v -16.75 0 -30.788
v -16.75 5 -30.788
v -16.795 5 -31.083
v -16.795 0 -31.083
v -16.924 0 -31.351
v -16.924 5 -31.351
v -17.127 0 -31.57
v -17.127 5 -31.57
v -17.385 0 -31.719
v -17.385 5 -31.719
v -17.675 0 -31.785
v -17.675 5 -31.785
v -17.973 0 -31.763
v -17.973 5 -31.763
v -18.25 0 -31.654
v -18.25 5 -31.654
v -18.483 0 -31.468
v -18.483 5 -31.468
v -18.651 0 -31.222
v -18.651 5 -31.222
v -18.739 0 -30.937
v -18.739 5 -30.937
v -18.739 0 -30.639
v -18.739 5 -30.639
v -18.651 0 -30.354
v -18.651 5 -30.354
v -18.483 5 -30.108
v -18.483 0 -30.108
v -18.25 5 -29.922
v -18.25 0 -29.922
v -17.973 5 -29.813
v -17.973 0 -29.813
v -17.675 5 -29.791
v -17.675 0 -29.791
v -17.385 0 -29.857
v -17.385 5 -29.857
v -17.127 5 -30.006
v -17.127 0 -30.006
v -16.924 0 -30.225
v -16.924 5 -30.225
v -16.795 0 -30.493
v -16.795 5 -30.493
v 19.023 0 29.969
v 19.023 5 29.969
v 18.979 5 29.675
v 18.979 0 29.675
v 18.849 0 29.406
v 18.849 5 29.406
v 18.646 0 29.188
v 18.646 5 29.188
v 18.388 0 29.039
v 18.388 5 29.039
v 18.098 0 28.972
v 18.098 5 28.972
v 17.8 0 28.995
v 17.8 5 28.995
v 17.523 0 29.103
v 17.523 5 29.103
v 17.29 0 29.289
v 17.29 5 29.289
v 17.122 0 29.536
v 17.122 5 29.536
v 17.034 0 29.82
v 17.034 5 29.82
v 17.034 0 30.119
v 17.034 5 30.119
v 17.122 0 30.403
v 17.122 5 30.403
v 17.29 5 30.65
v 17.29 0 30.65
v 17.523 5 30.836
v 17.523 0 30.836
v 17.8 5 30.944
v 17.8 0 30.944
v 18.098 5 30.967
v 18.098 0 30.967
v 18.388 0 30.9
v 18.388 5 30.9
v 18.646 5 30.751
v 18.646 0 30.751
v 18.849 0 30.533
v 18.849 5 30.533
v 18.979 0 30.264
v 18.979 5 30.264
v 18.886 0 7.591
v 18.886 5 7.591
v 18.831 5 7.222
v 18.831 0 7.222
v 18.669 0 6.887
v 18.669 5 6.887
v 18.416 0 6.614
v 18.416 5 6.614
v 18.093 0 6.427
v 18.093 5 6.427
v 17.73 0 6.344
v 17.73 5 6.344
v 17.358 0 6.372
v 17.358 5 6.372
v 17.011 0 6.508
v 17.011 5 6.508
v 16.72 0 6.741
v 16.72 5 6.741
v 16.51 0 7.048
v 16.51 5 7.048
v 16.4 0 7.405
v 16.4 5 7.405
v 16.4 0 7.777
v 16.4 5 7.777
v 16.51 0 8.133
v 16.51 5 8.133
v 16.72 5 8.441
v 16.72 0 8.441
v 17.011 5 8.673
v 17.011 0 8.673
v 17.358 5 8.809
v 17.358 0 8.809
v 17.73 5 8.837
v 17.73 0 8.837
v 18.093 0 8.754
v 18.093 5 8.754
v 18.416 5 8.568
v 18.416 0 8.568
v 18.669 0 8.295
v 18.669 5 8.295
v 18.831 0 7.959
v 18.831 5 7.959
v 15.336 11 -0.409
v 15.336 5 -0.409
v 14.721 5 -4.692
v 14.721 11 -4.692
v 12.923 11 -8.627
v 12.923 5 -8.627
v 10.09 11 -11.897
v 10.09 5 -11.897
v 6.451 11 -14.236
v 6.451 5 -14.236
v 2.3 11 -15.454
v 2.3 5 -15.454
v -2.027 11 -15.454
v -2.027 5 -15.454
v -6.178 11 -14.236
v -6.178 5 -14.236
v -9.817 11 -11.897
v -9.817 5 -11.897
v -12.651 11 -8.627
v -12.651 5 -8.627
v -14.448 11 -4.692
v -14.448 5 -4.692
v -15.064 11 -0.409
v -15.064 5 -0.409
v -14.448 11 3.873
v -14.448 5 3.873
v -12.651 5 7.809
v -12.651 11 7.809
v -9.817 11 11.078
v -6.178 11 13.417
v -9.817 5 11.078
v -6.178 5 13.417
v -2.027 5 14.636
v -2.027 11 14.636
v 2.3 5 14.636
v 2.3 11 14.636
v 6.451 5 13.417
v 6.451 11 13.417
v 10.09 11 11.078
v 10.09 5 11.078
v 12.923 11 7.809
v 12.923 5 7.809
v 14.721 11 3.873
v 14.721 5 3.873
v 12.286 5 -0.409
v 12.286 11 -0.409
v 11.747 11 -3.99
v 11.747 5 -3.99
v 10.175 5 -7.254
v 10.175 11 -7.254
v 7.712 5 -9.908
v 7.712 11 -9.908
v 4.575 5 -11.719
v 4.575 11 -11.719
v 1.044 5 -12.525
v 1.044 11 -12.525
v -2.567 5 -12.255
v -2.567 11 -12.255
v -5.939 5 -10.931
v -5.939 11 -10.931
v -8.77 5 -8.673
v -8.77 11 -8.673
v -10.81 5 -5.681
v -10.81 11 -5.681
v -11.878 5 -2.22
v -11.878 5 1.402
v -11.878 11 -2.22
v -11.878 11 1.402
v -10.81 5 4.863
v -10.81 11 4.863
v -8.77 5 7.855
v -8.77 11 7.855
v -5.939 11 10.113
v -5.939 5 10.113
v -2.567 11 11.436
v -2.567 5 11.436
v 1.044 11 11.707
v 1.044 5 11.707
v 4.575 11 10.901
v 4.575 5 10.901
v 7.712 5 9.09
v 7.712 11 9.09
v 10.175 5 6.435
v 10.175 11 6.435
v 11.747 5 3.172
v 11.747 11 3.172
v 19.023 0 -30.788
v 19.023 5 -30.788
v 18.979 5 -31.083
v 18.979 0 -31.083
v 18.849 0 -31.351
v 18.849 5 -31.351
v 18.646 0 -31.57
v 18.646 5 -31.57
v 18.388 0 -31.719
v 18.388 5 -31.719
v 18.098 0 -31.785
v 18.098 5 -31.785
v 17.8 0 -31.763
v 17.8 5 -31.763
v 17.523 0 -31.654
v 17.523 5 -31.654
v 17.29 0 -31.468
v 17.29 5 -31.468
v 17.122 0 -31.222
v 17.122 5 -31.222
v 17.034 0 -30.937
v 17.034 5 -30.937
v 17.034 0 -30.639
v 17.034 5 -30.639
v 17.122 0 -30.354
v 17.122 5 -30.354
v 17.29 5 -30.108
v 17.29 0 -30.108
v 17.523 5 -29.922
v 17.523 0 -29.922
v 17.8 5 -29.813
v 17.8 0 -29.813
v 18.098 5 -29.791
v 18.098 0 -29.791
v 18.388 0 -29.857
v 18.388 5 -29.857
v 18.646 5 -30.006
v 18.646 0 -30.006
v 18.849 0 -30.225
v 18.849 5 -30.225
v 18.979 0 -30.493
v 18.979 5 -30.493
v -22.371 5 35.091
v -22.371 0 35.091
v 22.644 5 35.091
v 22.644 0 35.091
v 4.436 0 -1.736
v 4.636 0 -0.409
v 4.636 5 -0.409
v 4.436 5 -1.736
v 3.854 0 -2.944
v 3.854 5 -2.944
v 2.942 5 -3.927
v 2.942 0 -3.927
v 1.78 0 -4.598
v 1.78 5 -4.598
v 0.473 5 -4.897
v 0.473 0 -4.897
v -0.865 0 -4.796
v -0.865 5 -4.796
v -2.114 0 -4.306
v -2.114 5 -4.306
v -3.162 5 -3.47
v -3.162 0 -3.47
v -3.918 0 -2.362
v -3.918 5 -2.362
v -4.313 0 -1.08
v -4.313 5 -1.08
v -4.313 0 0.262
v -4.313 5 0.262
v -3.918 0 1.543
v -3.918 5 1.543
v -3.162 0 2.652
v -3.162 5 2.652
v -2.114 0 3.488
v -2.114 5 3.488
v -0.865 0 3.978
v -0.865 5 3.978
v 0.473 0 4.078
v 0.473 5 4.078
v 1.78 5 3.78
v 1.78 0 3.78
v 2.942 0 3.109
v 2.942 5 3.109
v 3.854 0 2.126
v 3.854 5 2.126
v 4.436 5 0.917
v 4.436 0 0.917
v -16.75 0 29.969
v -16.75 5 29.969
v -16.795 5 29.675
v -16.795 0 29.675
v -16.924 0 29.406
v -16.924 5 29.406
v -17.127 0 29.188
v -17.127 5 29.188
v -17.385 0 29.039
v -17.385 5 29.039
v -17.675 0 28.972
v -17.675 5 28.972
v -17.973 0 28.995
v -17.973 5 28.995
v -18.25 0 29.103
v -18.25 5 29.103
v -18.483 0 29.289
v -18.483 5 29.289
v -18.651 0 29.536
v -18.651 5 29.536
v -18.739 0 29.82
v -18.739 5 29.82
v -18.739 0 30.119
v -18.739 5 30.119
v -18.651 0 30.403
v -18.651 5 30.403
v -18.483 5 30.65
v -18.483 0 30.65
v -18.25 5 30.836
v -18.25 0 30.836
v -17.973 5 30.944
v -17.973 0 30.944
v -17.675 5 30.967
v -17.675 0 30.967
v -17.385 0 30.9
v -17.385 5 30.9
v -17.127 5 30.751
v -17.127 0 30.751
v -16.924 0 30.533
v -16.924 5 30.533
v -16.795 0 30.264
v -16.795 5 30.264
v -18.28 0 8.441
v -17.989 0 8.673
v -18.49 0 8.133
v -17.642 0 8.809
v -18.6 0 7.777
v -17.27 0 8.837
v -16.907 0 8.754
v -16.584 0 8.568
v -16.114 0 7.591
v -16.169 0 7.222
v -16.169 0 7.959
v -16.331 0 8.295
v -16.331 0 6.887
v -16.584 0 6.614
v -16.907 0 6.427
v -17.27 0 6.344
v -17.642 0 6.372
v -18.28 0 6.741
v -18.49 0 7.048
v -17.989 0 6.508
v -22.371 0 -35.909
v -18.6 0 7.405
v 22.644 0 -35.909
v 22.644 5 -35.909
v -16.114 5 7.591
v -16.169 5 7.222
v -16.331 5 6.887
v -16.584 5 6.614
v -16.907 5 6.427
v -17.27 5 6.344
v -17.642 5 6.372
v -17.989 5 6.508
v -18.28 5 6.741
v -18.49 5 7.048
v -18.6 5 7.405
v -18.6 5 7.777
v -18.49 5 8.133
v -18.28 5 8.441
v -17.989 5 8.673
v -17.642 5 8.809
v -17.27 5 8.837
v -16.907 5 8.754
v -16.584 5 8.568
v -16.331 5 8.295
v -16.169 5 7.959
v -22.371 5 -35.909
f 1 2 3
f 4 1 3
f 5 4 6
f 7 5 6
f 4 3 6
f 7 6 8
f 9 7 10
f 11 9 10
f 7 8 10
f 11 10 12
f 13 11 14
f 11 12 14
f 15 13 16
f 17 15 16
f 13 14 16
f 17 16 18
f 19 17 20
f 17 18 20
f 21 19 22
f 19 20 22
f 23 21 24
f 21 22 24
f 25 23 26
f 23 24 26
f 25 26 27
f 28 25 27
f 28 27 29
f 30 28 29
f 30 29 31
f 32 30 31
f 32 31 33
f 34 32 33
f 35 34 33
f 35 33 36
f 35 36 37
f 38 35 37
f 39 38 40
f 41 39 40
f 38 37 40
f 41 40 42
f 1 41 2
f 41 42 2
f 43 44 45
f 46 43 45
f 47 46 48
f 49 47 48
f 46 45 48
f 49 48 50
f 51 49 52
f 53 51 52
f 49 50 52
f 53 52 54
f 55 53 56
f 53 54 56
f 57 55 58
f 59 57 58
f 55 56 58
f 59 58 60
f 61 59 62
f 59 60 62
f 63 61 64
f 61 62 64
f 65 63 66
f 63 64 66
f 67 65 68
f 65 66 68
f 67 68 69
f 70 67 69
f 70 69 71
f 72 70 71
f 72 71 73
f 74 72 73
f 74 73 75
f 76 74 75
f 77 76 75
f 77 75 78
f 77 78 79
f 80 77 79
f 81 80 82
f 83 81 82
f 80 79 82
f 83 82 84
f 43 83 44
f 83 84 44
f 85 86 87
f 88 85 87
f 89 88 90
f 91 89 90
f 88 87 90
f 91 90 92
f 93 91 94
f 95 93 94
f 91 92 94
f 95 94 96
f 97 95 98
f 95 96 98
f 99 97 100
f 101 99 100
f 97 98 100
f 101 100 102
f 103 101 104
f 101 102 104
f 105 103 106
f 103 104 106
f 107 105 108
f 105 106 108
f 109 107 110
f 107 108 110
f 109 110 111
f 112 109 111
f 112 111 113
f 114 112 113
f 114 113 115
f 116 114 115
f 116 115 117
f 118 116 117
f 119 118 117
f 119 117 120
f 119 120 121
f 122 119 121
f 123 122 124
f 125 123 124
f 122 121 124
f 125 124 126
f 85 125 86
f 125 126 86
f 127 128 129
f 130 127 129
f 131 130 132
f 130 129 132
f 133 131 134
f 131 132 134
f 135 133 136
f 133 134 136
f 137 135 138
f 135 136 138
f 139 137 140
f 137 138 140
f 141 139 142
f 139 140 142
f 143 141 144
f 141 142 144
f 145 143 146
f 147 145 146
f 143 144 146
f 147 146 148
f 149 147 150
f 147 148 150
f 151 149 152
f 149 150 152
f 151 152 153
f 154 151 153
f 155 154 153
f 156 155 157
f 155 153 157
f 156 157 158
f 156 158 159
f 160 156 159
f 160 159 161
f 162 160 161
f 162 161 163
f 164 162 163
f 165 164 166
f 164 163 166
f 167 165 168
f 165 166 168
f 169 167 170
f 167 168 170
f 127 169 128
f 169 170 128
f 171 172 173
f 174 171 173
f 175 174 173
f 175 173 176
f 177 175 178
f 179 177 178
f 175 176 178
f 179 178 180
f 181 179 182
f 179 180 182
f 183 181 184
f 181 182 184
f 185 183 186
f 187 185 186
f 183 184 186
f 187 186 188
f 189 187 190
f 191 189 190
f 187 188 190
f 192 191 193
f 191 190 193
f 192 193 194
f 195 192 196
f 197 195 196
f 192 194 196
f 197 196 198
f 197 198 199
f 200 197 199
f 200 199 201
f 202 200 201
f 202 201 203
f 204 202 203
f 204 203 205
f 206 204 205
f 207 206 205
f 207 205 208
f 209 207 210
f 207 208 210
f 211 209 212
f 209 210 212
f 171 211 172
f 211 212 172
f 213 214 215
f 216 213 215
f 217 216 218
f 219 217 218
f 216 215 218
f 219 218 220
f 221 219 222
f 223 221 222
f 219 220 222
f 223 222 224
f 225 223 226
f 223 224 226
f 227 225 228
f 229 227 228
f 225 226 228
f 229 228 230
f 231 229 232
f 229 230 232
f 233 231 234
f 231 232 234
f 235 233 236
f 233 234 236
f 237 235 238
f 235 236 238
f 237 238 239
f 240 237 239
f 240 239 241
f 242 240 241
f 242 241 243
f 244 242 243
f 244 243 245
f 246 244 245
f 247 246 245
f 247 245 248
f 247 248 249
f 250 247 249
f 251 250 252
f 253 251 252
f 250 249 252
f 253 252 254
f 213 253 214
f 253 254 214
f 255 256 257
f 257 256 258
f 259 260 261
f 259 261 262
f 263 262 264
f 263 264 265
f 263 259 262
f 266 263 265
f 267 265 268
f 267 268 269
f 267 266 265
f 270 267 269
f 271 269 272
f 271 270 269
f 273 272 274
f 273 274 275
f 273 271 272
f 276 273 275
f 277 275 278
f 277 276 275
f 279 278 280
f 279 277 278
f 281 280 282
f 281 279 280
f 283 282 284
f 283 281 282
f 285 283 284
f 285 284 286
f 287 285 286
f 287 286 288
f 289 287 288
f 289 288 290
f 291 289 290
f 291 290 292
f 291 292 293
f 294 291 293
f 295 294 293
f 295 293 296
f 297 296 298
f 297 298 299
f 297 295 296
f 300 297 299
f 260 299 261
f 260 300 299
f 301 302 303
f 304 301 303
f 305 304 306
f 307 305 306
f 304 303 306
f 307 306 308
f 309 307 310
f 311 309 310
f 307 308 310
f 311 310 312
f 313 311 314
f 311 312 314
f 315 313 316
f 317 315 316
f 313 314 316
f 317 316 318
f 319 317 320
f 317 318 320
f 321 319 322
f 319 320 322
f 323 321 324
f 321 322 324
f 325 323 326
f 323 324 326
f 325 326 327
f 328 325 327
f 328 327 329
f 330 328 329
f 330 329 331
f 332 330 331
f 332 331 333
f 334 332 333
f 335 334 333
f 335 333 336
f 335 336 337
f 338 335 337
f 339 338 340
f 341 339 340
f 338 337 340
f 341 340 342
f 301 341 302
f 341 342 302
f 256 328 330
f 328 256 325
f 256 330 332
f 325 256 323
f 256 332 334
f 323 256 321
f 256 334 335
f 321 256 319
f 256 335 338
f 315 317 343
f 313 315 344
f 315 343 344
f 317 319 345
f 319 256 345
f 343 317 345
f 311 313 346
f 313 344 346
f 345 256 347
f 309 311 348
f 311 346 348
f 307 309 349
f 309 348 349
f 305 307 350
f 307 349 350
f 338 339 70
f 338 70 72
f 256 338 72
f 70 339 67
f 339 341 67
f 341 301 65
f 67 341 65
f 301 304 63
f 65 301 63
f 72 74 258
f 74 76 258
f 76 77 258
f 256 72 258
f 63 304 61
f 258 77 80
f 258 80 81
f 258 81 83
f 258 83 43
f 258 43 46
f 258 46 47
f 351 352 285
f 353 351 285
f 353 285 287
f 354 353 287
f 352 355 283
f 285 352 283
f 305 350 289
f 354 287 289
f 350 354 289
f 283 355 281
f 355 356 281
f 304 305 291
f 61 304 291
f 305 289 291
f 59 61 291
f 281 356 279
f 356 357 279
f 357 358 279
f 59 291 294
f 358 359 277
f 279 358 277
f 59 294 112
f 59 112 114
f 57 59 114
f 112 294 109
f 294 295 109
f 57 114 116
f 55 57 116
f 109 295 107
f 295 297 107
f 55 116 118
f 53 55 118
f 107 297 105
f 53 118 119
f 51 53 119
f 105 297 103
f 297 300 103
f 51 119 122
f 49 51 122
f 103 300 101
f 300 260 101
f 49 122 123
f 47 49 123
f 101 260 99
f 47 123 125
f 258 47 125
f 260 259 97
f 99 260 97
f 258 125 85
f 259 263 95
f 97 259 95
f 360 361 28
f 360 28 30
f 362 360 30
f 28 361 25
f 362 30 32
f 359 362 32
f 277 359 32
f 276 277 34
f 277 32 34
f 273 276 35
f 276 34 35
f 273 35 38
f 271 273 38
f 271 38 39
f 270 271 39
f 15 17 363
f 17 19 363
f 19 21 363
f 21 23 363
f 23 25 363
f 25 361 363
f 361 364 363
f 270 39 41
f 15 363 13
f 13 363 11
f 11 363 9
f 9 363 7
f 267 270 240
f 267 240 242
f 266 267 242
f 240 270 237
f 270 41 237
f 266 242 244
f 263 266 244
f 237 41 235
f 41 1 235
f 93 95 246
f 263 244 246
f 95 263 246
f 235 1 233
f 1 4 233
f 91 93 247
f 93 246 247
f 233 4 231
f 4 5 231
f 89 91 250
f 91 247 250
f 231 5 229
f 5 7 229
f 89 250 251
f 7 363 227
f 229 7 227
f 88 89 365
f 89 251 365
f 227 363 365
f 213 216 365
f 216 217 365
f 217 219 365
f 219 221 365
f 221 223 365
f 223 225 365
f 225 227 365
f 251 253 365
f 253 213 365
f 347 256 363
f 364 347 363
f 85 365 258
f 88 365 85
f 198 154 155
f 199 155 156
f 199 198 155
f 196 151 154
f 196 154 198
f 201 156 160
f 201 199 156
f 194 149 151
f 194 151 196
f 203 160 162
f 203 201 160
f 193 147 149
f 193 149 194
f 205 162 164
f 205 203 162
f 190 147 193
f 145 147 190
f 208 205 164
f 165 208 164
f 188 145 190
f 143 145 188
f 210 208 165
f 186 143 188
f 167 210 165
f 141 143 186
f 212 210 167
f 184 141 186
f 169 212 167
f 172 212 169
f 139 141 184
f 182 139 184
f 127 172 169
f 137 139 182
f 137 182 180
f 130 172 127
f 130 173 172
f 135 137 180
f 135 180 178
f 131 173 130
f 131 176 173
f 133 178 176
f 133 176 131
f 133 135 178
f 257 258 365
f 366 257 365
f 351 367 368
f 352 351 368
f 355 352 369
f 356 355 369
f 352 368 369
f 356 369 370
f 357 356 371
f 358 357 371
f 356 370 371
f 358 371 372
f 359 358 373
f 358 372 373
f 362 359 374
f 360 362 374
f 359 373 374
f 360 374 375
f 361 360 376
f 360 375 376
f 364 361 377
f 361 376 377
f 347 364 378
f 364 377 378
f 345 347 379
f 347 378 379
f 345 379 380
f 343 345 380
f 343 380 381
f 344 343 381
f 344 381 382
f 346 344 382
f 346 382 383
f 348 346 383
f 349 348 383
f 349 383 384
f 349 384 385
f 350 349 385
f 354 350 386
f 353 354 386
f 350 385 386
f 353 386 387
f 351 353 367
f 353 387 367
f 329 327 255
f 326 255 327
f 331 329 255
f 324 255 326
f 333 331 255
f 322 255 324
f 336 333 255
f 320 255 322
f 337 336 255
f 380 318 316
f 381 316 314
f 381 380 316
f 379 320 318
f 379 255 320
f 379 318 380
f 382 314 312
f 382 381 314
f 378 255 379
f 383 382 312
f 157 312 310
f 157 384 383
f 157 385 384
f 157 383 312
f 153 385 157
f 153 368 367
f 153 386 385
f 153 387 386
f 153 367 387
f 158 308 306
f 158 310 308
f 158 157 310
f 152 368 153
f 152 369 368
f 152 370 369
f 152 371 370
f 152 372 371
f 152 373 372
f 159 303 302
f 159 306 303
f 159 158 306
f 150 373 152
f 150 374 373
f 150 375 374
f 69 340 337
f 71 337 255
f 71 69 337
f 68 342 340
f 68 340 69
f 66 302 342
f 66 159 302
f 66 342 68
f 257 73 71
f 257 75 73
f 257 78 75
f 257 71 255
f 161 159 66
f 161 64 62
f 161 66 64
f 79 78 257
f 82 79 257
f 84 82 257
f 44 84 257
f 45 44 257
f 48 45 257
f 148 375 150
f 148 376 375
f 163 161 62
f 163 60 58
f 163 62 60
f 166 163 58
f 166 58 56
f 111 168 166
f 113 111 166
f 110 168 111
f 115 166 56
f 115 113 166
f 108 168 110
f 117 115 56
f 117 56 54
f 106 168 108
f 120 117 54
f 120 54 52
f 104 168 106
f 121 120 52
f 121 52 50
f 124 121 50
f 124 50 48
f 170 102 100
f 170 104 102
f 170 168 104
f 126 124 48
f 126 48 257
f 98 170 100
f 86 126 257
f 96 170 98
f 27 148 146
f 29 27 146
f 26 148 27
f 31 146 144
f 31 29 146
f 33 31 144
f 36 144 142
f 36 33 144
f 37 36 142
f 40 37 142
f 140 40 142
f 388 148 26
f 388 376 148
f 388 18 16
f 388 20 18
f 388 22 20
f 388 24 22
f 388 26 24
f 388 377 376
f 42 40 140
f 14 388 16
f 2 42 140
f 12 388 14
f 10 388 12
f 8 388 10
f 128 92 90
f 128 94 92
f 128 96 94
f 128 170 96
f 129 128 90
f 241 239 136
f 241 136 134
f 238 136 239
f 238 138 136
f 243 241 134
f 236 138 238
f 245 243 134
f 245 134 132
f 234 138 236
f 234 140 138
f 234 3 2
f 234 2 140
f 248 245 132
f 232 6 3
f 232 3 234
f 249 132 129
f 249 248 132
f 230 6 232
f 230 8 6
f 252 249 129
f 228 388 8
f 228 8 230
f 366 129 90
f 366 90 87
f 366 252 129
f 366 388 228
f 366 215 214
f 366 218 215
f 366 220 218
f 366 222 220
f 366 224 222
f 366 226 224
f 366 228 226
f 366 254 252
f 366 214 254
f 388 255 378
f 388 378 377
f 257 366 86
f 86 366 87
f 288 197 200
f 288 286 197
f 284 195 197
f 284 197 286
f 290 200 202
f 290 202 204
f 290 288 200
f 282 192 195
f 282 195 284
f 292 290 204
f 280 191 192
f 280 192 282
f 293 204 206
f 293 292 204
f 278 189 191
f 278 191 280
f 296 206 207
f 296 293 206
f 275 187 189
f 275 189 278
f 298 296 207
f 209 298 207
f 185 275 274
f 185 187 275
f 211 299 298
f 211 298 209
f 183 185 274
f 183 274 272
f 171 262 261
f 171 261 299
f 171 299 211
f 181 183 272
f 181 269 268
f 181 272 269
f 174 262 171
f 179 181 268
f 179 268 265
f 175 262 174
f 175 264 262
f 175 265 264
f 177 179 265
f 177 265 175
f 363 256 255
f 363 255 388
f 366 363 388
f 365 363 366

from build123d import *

# Parameters (mm, degrees)
SKETCH1_W           = 45.01572081
SKETCH1_H           = 71
SKETCH1_R           = 1.75
SKETCH1_R_2         = 4.5
BOSS_EXTRUDE1_DEPTH = 5
SKETCH2_R           = 15.2
SKETCH2_R_2         = 12.2
BOSS_EXTRUDE2_DEPTH = 6
SKETCH3_R           = 1.5
CUT_EXTRUDE1_DEPTH  = 60
SKETCH4_R           = 12.2
SKETCH4_R_2         = 12.15
BOSS_EXTRUDE3_DEPTH = 6
SKETCH5_R           = 1.5
SKETCH5_R_2         = 1
SKETCH5_R_3         = 1.75
SKETCH5_R_4         = 1.25
BOSS_EXTRUDE4_DEPTH = 5


with BuildPart() as part:
    # Sketch1 → Boss-Extrude1 (new body)
    with BuildSketch(Plane(origin=(0, 0, 0), x_dir=(1, 0, 0), z_dir=(0, 1, 0))):
        with Locations((0.136395343, 0.409186029)):
            Rectangle(SKETCH1_W, SKETCH1_H)
        with Locations((17.636395343, -7.590813971)):
            Circle(SKETCH1_R, mode=Mode.SUBTRACT)
        with Locations((0.136395343, 0.409186029)):
            Circle(SKETCH1_R_2, mode=Mode.SUBTRACT)
        with Locations((-17.363604657, -7.590813971)):
            Circle(SKETCH1_R, mode=Mode.SUBTRACT)
    extrude(amount=BOSS_EXTRUDE1_DEPTH)

    # Sketch2 → Boss-Extrude2 (add)
    with BuildSketch(Plane(origin=(0, 5, 0), x_dir=(1, 0, 0), z_dir=(0, 1, 0))):
        with Locations((0.136395343, 0.409186029)):
            Circle(SKETCH2_R)
        with Locations((0.136395343, 0.409186029)):
            Circle(SKETCH2_R_2, mode=Mode.SUBTRACT)
    extrude(amount=BOSS_EXTRUDE2_DEPTH)

    # Sketch3 → Cut-Extrude1 (cut)
    with BuildSketch(Plane.XZ):
        with Locations((18.022935404, 29.969493628)):
            Circle(SKETCH3_R)
        with Locations((-17.750144718, 29.969493628)):
            Circle(SKETCH3_R)
        with Locations((-17.750144718, -30.787865685)):
            Circle(SKETCH3_R)
        with Locations((18.022935404, -30.787865685)):
            Circle(SKETCH3_R)
    extrude(amount=-CUT_EXTRUDE1_DEPTH, mode=Mode.SUBTRACT)

    # Sketch4 → Boss-Extrude3 (add)
    with BuildSketch(Plane(origin=(0, 11, 0), x_dir=(1, 0, 0), z_dir=(0, 1, 0))):
        with Locations((0.136395343, 0.409186029)):
            Circle(SKETCH4_R)
        with Locations((0.136395343, 0.409186029)):
            Circle(SKETCH4_R_2, mode=Mode.SUBTRACT)
    extrude(amount=-BOSS_EXTRUDE3_DEPTH)

    # Sketch5 → Boss-Extrude4 (add)
    with BuildSketch(Plane(origin=(0, 5, 0), x_dir=(1, 0, 0), z_dir=(0, 1, 0))):
        with Locations((-17.750144718, -29.969493628)):
            Circle(SKETCH5_R)
        with Locations((-17.750144718, -29.969493628)):
            Circle(SKETCH5_R_2, mode=Mode.SUBTRACT)
        with Locations((18.022935404, -29.969493628)):
            Circle(SKETCH5_R)
        with Locations((18.022935404, -29.969493628)):
            Circle(SKETCH5_R_2, mode=Mode.SUBTRACT)
        with Locations((17.636395343, -7.590813971)):
            Circle(SKETCH5_R_3)
        with Locations((17.636395343, -7.590813971)):
            Circle(SKETCH5_R_4, mode=Mode.SUBTRACT)
        with Locations((-17.363604657, -7.590813971)):
            Circle(SKETCH5_R_3)
        with Locations((-17.363604657, -7.590813971)):
            Circle(SKETCH5_R_4, mode=Mode.SUBTRACT)
        with Locations((-17.750144718, 30.787865685)):
            Circle(SKETCH5_R)
        with Locations((-17.750144718, 30.787865685)):
            Circle(SKETCH5_R_2, mode=Mode.SUBTRACT)
        with Locations((18.022935404, 30.787865685)):
            Circle(SKETCH5_R)
        with Locations((18.022935404, 30.787865685)):
            Circle(SKETCH5_R_2, mode=Mode.SUBTRACT)
    extrude(amount=-BOSS_EXTRUDE4_DEPTH)


solid = part.part
